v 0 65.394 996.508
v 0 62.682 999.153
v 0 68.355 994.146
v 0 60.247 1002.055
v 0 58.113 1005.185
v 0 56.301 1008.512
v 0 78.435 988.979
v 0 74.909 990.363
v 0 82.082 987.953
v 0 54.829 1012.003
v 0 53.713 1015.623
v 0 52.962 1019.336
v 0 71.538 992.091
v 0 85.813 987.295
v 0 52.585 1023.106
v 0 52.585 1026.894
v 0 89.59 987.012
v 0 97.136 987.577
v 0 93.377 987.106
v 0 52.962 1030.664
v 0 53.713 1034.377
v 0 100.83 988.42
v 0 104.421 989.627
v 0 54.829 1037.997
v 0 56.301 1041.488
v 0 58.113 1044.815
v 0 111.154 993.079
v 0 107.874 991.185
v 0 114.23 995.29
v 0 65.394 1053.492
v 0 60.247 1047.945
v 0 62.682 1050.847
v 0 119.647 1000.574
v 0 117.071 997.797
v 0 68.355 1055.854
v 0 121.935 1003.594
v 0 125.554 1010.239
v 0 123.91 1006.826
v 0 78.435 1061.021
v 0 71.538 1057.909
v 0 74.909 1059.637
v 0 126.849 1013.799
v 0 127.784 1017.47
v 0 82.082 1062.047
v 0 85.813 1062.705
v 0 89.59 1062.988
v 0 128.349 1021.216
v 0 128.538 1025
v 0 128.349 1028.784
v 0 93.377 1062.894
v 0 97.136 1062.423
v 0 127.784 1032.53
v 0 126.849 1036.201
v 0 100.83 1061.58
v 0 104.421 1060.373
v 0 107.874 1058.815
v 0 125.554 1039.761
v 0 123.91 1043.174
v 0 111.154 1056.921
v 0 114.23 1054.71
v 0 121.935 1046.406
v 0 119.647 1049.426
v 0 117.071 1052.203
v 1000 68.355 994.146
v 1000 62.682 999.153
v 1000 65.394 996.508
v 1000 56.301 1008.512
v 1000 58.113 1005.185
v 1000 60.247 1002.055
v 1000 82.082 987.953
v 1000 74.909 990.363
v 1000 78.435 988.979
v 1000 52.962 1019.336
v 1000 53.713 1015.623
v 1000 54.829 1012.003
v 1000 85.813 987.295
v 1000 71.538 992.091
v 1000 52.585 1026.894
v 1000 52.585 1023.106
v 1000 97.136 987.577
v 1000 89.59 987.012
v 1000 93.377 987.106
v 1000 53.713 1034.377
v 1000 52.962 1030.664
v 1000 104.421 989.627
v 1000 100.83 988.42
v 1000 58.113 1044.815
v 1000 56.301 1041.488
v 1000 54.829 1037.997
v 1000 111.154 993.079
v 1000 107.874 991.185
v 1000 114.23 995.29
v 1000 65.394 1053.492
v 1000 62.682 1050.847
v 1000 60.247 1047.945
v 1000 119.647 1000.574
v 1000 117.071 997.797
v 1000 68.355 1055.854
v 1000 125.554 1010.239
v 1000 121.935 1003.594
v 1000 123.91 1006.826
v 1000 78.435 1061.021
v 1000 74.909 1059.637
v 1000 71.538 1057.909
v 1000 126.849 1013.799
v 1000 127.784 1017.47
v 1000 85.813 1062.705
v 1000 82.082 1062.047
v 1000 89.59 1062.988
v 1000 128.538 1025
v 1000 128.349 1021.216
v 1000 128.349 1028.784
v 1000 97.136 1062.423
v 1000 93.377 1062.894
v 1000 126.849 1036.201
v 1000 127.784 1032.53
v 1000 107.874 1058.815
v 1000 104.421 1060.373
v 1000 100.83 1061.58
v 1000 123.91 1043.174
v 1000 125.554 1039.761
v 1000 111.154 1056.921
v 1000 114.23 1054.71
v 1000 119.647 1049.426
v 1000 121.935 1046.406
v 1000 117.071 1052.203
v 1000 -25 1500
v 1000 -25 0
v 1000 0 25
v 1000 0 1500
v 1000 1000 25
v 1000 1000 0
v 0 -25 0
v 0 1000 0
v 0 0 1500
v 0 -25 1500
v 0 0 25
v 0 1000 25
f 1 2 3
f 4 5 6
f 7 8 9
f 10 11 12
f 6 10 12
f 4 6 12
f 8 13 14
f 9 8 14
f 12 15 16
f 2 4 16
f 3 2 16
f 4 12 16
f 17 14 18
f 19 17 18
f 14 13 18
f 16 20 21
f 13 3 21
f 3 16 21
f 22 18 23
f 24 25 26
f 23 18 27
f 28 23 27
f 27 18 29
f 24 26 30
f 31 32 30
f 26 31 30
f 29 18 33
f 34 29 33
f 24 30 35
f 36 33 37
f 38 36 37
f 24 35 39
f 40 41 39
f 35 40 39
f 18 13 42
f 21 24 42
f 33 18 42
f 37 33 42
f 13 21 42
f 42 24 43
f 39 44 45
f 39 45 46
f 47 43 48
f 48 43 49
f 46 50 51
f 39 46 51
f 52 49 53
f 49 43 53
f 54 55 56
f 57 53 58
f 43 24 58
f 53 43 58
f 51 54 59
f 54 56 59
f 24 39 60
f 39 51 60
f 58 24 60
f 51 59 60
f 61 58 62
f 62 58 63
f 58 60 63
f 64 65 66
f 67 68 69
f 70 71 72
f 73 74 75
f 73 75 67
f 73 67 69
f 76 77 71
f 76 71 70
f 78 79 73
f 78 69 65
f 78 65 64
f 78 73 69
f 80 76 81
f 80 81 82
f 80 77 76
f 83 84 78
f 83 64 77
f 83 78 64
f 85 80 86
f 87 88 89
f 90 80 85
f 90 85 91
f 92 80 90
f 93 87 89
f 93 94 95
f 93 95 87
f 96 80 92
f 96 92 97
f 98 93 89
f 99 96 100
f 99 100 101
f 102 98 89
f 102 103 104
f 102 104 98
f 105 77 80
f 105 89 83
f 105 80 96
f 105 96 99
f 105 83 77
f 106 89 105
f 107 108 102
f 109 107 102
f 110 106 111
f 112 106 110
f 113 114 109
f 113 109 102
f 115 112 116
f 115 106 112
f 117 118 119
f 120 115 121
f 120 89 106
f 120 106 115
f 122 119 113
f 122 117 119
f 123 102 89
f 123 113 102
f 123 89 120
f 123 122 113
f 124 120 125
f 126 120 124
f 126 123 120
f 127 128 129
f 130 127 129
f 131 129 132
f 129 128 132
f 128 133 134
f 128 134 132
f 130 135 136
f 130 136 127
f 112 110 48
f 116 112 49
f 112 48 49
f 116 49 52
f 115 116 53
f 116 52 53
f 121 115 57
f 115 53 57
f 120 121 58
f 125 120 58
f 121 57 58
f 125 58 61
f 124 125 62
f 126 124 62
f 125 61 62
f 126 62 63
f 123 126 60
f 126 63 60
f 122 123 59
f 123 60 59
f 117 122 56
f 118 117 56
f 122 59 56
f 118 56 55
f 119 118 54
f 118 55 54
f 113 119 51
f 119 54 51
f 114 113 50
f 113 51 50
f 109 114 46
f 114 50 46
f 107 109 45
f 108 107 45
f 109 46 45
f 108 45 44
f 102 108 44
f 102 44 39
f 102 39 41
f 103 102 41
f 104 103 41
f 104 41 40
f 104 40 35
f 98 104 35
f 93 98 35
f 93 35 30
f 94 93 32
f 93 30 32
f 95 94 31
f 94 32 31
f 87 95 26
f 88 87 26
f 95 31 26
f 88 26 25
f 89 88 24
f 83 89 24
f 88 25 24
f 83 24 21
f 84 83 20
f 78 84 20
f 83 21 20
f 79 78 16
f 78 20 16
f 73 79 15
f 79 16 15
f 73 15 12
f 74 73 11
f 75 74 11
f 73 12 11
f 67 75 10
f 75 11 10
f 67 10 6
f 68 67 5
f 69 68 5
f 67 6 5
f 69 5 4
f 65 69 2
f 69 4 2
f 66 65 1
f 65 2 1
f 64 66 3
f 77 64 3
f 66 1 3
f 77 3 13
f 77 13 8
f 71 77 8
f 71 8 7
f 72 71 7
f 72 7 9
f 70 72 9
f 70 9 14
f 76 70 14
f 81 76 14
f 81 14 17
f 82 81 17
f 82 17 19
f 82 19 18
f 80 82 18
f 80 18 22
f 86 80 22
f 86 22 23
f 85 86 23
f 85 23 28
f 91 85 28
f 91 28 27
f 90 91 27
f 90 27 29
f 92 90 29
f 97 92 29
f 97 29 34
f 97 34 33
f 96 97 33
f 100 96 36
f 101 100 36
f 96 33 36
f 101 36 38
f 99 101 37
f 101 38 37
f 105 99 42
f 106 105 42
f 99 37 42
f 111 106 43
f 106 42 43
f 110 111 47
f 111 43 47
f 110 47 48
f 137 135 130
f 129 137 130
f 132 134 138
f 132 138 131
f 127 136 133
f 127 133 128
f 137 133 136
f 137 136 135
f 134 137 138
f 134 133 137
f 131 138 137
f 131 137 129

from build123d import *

# Parameters (mm, degrees)
F0_W     = 1000
F0_H     = 1500
F1_DEPTH = 25
F2_W     = 1000
F2_H     = 1000
F3_DEPTH = 25
F4_R     = 38
F5_DEPTH = 1000


with BuildPart() as f1:
    # F0 (on Front) → F1 (new body)
    with BuildSketch(Plane.XZ):
        with Locations((500, 750)):
            Rectangle(F0_W, F0_H)
    extrude(amount=F1_DEPTH)

    # F2 (on Top) → F3 (join)
    with BuildSketch(Plane.XY):
        with Locations((500, 500)):
            Rectangle(F2_W, F2_H)
    extrude(amount=F3_DEPTH)


with BuildPart() as f5:
    # F4 (on Right) → F5 (new body)
    with BuildSketch(Plane.YZ):
        with Locations((90.537608, 1025)):
            Circle(F4_R)
    extrude(amount=F5_DEPTH)


solid = Compound([f1.part, f5.part])
